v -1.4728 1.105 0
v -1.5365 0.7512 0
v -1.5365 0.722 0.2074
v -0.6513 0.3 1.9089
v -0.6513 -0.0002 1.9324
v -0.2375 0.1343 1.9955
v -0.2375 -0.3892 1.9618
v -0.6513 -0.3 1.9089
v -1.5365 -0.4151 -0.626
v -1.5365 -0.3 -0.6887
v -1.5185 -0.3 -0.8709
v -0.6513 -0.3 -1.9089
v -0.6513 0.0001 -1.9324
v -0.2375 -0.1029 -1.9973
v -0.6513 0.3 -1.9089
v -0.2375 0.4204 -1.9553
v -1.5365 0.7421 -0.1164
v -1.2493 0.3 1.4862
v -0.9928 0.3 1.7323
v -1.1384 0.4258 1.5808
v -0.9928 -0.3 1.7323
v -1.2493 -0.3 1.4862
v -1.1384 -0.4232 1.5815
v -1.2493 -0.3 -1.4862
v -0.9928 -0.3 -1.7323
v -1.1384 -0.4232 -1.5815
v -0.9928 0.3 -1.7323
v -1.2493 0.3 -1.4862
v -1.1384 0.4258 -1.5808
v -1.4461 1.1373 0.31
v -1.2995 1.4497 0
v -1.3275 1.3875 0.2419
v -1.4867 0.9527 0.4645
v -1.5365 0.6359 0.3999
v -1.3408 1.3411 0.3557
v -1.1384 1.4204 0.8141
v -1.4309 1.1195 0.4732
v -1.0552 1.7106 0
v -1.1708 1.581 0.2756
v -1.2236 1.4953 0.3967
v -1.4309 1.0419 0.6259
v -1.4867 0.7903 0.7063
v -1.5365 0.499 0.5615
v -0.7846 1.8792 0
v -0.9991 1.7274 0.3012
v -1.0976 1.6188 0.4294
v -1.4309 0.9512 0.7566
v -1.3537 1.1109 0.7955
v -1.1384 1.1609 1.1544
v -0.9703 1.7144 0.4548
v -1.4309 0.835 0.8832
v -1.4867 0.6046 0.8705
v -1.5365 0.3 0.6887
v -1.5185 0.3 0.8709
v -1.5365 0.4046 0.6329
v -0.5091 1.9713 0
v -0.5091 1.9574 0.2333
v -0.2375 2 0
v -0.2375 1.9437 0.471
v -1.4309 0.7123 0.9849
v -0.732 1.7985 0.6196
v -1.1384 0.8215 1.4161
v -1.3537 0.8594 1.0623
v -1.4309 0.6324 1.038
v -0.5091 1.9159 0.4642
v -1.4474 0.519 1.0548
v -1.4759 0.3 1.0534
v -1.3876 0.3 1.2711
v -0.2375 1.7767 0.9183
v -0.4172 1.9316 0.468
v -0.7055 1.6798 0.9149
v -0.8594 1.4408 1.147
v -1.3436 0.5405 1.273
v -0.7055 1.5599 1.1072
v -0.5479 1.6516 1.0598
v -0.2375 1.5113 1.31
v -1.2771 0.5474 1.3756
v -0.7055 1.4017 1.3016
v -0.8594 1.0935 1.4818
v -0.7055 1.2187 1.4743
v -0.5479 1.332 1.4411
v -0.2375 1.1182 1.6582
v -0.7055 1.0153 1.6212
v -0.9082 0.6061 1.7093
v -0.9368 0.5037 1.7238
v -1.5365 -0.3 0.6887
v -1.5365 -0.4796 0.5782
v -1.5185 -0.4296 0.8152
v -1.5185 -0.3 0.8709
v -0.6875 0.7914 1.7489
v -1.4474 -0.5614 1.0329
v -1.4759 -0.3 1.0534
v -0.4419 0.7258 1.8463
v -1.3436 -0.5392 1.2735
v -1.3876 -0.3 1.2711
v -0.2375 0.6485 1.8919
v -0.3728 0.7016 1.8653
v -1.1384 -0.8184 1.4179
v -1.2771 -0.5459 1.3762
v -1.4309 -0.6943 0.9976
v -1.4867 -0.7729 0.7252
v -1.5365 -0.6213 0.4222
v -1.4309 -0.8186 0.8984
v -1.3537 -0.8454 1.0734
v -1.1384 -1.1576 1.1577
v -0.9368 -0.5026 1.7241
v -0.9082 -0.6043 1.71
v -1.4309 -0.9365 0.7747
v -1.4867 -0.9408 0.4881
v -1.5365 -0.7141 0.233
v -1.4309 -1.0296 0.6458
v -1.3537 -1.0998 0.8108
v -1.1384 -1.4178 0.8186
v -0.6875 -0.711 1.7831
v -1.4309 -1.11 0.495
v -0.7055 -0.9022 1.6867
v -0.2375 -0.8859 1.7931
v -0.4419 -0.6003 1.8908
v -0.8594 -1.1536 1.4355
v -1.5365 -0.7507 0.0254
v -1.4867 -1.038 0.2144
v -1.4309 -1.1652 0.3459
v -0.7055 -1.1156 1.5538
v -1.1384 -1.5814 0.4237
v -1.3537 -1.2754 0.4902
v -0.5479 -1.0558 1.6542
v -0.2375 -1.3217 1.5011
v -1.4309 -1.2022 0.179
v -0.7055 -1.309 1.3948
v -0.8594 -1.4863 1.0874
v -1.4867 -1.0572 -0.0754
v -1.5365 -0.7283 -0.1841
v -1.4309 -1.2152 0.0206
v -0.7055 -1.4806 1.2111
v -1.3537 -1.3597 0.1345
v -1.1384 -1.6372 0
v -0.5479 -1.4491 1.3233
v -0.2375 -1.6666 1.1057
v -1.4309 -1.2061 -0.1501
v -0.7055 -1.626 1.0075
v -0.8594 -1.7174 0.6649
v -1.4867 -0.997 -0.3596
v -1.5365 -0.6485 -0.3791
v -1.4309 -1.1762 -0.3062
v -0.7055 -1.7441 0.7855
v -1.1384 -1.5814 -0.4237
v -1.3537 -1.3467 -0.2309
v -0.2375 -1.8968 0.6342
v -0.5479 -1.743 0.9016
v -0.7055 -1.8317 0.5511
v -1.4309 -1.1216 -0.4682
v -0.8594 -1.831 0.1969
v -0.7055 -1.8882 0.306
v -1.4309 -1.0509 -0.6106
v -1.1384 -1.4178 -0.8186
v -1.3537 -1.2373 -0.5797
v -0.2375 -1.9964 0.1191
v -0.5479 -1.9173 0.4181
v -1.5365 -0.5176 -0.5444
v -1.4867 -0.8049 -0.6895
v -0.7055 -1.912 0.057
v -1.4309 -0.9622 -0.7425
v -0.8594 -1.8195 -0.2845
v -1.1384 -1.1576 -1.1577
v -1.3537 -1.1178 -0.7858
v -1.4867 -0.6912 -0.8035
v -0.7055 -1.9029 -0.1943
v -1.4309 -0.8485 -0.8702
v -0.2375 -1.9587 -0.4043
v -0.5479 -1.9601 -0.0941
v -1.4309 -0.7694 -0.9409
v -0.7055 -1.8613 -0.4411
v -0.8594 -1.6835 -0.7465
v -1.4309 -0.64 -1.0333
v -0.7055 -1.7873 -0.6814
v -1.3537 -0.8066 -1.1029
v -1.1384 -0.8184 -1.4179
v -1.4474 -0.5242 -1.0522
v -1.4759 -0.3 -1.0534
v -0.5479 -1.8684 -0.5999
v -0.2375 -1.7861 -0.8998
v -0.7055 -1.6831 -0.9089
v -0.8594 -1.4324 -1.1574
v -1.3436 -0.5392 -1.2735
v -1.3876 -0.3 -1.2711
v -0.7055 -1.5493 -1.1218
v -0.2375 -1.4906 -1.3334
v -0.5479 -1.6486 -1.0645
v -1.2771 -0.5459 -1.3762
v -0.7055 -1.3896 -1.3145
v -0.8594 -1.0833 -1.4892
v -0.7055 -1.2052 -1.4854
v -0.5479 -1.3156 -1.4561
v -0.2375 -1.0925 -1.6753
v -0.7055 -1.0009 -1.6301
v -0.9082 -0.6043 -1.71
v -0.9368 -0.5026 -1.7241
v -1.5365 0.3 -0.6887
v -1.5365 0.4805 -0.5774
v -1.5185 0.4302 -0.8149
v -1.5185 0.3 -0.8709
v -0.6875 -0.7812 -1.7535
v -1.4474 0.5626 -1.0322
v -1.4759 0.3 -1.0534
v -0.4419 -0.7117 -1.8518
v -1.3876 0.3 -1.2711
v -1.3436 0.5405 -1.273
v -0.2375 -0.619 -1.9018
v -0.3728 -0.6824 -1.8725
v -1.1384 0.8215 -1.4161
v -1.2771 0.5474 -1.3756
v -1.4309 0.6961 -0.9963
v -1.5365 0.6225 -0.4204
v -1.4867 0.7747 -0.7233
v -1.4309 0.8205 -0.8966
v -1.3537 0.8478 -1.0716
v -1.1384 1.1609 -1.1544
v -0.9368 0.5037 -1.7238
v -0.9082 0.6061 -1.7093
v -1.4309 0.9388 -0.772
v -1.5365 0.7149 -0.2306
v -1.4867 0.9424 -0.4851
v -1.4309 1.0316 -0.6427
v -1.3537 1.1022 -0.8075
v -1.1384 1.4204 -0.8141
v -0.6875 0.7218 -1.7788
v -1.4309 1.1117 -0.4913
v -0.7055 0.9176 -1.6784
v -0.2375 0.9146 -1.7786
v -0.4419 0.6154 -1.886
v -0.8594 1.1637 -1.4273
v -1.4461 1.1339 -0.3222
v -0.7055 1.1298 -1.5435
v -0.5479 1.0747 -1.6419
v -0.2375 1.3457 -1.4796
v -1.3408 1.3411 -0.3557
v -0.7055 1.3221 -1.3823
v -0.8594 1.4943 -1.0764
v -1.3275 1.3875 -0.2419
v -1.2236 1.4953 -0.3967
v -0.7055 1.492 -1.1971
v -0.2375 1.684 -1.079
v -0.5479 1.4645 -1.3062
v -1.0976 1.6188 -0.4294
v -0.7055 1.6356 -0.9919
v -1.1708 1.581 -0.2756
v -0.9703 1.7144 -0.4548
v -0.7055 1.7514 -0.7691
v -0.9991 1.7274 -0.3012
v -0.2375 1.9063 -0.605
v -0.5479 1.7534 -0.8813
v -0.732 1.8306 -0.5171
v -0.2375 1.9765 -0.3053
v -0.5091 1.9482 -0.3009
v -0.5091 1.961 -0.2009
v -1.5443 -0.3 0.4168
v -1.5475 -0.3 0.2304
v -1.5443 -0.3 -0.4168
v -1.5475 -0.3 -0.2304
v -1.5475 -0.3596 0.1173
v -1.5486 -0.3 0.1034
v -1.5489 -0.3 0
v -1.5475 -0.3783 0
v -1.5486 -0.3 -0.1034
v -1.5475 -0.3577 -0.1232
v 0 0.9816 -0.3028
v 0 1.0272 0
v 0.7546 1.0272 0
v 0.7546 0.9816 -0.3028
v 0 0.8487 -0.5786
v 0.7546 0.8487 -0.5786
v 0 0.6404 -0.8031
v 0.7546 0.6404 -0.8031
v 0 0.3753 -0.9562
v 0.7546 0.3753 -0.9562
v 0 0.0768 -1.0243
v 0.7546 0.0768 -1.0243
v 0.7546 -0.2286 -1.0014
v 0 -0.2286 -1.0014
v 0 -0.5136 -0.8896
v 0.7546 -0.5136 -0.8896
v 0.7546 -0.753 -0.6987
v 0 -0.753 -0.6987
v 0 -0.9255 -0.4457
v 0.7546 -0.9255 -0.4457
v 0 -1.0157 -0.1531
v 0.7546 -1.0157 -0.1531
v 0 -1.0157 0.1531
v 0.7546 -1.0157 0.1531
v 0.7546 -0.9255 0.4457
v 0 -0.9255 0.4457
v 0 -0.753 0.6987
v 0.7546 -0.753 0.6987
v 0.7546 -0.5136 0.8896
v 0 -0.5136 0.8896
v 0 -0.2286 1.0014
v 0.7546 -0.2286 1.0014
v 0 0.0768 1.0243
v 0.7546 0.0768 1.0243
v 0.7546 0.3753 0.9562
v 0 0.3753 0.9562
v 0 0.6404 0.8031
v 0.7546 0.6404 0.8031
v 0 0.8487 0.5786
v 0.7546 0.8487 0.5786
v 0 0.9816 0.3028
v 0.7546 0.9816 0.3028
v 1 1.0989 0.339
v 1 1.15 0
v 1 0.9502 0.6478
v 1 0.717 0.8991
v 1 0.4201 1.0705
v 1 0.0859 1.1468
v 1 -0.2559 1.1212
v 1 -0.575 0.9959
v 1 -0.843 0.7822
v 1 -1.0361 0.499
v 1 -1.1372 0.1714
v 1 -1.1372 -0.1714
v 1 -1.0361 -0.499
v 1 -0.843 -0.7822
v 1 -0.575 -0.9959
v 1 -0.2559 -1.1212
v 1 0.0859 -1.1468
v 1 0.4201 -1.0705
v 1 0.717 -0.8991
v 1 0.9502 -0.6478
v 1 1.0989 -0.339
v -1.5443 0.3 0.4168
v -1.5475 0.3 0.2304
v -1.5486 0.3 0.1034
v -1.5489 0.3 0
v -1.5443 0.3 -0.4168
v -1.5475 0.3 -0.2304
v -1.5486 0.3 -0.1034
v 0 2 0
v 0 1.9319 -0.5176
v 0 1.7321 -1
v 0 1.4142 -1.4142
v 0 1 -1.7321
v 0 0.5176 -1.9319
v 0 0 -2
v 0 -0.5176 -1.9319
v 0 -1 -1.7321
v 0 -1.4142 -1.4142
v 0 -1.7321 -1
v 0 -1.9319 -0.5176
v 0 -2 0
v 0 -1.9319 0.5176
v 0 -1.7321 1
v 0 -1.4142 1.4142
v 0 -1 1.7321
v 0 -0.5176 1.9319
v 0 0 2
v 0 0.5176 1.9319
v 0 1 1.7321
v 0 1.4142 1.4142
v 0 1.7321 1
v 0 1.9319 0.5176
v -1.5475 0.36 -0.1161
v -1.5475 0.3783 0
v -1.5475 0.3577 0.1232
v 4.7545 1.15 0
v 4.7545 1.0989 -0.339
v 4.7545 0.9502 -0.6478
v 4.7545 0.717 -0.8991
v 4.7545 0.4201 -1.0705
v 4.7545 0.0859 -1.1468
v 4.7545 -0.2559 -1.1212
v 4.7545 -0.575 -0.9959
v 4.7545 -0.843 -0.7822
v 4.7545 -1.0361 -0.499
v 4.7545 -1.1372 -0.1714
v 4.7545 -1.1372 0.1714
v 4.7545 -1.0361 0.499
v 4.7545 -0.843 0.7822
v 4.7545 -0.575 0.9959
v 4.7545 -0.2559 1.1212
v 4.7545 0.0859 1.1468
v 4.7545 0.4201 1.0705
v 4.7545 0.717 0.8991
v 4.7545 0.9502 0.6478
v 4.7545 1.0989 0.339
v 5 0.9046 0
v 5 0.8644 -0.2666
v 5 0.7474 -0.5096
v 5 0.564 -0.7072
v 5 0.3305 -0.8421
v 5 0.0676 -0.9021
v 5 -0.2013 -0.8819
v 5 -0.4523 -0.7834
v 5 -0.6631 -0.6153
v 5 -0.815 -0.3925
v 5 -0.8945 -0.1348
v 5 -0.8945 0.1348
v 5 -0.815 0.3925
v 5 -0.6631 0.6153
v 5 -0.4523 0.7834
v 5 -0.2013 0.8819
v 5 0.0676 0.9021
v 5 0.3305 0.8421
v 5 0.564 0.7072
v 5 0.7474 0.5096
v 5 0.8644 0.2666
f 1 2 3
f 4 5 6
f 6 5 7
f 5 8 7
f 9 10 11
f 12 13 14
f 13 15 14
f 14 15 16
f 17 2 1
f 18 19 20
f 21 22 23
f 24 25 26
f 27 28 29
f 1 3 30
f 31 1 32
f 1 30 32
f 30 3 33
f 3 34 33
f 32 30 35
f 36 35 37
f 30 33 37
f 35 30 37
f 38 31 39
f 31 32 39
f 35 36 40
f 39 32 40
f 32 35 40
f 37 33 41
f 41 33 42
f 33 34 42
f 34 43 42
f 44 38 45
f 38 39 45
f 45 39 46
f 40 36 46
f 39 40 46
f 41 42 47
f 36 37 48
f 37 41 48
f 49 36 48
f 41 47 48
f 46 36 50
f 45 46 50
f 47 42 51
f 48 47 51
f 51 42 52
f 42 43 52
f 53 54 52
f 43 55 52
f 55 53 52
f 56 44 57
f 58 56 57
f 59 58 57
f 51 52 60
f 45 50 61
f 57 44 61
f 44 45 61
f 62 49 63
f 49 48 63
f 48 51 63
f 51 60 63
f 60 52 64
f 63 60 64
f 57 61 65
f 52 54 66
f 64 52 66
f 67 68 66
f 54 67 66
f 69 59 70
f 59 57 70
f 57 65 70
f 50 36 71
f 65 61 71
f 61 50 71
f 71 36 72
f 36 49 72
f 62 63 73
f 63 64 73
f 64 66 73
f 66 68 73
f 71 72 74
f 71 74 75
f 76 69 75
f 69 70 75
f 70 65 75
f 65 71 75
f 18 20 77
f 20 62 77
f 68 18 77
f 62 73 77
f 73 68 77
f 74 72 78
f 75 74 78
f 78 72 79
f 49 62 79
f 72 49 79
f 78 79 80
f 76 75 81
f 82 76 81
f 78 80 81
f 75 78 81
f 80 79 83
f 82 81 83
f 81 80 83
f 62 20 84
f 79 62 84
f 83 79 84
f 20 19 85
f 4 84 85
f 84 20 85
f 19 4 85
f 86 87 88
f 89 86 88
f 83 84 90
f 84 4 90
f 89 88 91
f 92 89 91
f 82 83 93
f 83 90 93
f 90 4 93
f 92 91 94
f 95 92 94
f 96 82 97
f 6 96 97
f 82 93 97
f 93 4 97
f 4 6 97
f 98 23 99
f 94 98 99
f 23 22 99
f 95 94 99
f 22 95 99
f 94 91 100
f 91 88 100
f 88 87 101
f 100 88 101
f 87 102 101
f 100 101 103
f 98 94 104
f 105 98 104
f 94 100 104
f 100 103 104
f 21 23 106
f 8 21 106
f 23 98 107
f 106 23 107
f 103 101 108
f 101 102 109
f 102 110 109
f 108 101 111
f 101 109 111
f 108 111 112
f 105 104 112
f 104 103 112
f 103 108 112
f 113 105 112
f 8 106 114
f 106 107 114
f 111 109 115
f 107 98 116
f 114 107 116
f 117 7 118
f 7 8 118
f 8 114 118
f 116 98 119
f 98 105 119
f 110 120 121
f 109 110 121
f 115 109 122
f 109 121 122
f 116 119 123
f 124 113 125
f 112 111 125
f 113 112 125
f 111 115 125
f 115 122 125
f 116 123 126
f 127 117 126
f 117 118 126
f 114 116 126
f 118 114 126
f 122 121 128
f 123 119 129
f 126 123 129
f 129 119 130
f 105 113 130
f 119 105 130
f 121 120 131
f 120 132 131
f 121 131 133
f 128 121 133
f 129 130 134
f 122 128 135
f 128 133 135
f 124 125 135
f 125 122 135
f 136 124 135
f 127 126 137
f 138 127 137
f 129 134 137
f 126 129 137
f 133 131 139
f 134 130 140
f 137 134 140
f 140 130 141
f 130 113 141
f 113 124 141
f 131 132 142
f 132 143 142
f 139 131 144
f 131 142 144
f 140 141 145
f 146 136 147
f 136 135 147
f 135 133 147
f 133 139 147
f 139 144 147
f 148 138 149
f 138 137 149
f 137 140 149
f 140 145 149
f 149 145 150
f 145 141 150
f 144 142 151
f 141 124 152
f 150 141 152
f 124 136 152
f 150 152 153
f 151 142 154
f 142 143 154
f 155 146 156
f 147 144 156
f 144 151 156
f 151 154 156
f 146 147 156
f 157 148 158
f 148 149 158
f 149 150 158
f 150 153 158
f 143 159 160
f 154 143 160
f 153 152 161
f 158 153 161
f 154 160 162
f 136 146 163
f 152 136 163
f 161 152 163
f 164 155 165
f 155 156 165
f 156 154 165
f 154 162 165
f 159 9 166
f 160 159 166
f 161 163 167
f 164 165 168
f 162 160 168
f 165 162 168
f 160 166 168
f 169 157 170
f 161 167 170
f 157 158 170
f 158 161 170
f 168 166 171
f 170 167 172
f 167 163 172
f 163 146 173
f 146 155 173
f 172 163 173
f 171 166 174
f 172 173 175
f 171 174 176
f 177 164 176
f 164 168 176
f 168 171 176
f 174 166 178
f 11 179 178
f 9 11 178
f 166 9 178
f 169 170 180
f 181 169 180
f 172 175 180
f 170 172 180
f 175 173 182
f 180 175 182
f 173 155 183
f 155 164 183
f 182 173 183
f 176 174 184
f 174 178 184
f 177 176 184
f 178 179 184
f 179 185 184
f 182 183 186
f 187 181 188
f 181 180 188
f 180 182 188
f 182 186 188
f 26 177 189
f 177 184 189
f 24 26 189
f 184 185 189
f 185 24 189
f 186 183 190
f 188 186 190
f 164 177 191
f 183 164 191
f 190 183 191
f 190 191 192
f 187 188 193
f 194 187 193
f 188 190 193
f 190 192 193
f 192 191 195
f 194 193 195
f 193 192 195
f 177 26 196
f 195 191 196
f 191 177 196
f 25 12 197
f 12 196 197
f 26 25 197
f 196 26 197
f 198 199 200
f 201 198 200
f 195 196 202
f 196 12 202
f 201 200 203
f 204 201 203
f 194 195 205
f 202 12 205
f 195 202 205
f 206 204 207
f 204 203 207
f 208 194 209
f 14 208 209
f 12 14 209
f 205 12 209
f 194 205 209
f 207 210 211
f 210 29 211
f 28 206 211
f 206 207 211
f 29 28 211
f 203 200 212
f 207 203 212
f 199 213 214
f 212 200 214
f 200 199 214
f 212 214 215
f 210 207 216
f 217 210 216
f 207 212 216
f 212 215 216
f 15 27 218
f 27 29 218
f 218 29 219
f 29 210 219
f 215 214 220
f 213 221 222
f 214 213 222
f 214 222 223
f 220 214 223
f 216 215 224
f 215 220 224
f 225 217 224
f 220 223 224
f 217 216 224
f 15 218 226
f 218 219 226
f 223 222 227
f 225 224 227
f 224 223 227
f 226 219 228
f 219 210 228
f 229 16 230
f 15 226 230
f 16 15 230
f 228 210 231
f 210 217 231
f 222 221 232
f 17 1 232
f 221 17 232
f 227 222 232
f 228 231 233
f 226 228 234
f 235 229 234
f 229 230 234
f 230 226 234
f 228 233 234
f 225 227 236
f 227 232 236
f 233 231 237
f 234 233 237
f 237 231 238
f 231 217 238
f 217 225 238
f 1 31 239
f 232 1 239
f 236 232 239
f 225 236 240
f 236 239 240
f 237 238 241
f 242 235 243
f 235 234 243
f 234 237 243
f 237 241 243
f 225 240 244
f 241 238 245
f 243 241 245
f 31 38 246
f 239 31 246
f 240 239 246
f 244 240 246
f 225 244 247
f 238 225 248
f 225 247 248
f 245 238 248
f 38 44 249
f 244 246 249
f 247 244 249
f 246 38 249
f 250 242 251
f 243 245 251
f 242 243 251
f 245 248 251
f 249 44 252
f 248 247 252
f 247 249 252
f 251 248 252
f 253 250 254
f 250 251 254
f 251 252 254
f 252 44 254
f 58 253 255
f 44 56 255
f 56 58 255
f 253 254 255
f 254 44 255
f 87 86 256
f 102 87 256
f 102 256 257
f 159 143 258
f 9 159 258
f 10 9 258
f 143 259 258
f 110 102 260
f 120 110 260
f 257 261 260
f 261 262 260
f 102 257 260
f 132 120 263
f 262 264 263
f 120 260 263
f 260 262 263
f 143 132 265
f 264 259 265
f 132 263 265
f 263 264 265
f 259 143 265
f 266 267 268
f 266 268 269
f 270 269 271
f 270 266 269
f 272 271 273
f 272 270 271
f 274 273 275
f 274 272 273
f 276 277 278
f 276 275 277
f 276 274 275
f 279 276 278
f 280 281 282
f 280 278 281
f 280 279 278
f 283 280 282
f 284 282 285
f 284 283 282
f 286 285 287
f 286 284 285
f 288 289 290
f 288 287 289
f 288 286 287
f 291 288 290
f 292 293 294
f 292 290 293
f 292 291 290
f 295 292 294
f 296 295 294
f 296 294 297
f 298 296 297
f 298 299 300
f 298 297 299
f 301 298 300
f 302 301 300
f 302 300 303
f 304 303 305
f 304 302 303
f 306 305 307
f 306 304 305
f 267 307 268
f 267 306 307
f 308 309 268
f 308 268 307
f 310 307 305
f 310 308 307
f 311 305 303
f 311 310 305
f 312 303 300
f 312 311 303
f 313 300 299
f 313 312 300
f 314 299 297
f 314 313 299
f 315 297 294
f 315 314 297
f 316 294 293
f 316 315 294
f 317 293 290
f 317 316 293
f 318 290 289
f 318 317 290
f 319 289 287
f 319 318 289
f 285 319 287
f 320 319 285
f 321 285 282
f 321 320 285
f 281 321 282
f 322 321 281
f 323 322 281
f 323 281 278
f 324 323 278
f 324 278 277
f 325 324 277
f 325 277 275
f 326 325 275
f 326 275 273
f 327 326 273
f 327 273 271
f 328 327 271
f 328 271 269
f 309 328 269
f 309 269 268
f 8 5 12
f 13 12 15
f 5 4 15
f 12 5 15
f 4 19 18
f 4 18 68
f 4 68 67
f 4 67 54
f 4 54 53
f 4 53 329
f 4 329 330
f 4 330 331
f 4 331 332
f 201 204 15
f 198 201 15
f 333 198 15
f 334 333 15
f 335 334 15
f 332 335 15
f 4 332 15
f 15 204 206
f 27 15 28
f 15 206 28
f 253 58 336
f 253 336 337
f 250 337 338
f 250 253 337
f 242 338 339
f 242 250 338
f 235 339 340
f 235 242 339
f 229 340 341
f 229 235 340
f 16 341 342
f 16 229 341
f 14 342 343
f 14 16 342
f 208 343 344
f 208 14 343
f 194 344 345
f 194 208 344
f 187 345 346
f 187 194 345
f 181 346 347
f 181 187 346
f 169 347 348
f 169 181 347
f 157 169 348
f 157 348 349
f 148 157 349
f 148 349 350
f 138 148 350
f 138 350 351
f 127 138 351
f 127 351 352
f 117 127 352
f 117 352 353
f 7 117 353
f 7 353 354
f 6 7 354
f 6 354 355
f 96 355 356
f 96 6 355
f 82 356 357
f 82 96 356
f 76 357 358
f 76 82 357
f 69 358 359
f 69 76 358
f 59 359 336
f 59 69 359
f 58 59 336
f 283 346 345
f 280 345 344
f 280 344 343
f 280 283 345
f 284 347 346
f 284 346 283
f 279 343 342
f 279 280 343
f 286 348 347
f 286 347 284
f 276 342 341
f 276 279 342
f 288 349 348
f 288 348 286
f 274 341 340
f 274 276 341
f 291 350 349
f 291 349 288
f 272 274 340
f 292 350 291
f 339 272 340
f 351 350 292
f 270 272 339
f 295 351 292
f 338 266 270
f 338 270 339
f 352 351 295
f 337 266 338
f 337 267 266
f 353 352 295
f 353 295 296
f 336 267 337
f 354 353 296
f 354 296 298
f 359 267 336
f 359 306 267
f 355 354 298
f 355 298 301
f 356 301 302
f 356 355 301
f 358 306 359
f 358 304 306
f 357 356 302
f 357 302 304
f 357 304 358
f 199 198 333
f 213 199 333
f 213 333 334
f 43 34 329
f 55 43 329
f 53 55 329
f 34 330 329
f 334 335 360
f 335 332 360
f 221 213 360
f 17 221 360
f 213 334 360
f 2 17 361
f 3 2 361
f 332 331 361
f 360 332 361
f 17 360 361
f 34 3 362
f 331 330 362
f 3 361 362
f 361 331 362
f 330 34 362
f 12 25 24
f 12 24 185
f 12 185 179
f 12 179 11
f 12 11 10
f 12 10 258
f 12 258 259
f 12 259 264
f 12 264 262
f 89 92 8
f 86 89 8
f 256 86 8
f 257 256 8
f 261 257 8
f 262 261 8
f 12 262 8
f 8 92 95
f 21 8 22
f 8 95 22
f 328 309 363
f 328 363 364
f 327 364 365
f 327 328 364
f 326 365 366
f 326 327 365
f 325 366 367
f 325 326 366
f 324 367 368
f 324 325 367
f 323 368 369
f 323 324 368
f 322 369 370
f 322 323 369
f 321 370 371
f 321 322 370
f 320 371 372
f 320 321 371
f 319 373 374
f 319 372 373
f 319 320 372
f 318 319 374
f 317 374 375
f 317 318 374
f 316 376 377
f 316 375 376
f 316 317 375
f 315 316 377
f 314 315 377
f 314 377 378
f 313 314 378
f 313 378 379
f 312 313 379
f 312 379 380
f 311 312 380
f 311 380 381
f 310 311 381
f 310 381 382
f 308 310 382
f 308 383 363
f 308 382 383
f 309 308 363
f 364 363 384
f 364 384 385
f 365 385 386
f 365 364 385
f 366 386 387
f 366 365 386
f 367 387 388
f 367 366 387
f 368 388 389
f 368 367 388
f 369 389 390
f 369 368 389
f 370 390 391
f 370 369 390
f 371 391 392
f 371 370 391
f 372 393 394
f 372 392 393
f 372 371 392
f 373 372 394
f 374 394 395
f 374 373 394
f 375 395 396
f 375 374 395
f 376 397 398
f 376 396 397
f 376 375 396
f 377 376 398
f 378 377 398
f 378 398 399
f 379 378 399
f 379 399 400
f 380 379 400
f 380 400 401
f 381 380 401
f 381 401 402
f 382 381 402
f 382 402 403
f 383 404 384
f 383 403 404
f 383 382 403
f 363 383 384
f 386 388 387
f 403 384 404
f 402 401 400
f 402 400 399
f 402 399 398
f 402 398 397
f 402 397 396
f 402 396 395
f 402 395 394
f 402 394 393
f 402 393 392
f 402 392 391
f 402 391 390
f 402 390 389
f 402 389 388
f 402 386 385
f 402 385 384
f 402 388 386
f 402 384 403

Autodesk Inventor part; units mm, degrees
ref_plane "YZ Plane" through (0, 0, 0) normal (1, 0, 0) x (0, 1, 0)
sketch "Sketch1" plane through (0, 0, 0) normal (0, 0, 1) x (1, 0, 0)
  line L0 (-1.5513, 0) -> (5, 0)
  line L1 (5, 0) -> (5, 1.15)
  line L2 (5, 1.15) -> (1, 1.15)
  line L3 (1, 1.15) -> (0.7546, 1.0272)
  line L4 (0.7546, 1.0272) -> (0, 1.0272)
  line L5 (0, 1.0272) -> (0, 2)
  line L6 (-5.4046, 0) -> (21.3851, 0) projected
  line L7 (0, -0.4002) -> (0, 2.4013) projected
  line L8 (0, 2) -> (-1.4463, 1.9997)
  arc A0 (-1.4463, 1.9997) -> (-1.5513, 0) centre (17.558, 0) ccw
  dimension "d0" = 5
  dimension "d1" = 4
  dimension "d2" = 0.2454
  dimension "d3" = 1.5513
  dimension "d4" = 2.3
  dimension "d5" = 2.0545
  dimension "d9" = 4
  dimension "d10" = 0.01
  dimension "d15" = 19.1093
revolve "Body" add sketch "Sketch1" angle 360 about axis through (-1.5513, 0, 0) along (1, 0, 0)
fillet "Fillet1" radius 1.3 1 edges at (-1.4463, -1.9997, 0)
ref_plane "IDS_WORKPLANE{1}" through (-1.5513, 0, 0) normal (1, 0, 0) x (0, 0, -1)
sketch "Sketch2" plane through (-1.5513, 0, 0) normal (1, 0, 0) x (0, 0, -1)
  line L0 (0, -2.8) -> (0, 2.8) projected
  line L1 (2.8, 0) -> (-2.8, 0) projected
  line L2 (-2, 0.3) -> (2, 0.3)
  line L3 (2, 0.3) -> (2, -0.3)
  line L4 (2, -0.3) -> (-2, -0.3)
  line L5 (-2, -0.3) -> (-2, 0.3)
  line L6 (0, 0.3) -> (0, -0.3) construction
  line L7 (-2, 0) -> (2, 0) construction
  circle A0 centre (0, 0) radius 2 projected
  dimension "d17" = 0.6
extrude "Slot" cut sketch "Sketch2" along normal blind 0.9 contours L4 A0 L1 L0 | L0 L1 A0 L4 | L4 L5 A0 | A0 L3 L4 | L1 A0 L2 L0 | L0 L2 A0 L1 | L5 L2 A0 | A0 L2 L3
thread "Thread" size "M2.3x0.4" class "6g" standard "ISO Metric profile" length 4
chamfer "Chamfer1" distance 0.2454 distance2 0.2455 1 edges at (5, -1.15, 0) measured on face at (5, 0.3197, -0.0157)
ref_plane "Work Plane2" through (8.25, 0, 0) normal (0, 0, -1) x (1, 0, 0)
equation "\"d0\" = NLG"
equation "\"d1\" = GEL"
equation "\"d2\" = GAL"
equation "\"d3\" = KOH"
equation "\"d4\" = GD"
equation "\"d5\" = BDM"
equation "\"d9\" = KOD"
equation "\"d10\" = KEWI"
equation "\"d17\" = SBR"
equation "\"d18\" = STI"
equation "\"d20\" = RR"
equation "\"d11\" = GEL"
equation "\"d13\" = -0.5 * SPD + 0.5 * GD"
equation "\"GD\" = NND"
equation "\"NLG\" = 5"
equation "\"GEL\" = 4"
equation "\"KOD\" = 4"
equation "\"KOH\" = 1.55125"
equation "\"GAL\" = 0.61345 * PTC"
equation "\"SPD\" = NND - 1.2269 * PTC"
equation "\"BDM\" = 2.0545"
equation "\"GUL\" = 0.61345 * PTC"
equation "\"RR\" = 1.3"
equation "\"SBR\" = 0.6"
equation "\"STI\" = 0.9"
equation "\"KEWI\" = 0.01deg"
equation "\"KR\" = 2.4"
equation "\"d16\" = -KOH"
equation "\"PTC\" = 0.4"
equation "\"THREADDIA\" = 2.3"
equation "\"TOA\" = 30deg"
equation "\"NND\" = 2.3"
equation "\"ORI\" = 1.3"
equation "\"GD1\" = THREADDIA - 1.2269 * PTC"
properties part number "CNS 9671 - M2.3 x 5" material "Steel, Mild"
